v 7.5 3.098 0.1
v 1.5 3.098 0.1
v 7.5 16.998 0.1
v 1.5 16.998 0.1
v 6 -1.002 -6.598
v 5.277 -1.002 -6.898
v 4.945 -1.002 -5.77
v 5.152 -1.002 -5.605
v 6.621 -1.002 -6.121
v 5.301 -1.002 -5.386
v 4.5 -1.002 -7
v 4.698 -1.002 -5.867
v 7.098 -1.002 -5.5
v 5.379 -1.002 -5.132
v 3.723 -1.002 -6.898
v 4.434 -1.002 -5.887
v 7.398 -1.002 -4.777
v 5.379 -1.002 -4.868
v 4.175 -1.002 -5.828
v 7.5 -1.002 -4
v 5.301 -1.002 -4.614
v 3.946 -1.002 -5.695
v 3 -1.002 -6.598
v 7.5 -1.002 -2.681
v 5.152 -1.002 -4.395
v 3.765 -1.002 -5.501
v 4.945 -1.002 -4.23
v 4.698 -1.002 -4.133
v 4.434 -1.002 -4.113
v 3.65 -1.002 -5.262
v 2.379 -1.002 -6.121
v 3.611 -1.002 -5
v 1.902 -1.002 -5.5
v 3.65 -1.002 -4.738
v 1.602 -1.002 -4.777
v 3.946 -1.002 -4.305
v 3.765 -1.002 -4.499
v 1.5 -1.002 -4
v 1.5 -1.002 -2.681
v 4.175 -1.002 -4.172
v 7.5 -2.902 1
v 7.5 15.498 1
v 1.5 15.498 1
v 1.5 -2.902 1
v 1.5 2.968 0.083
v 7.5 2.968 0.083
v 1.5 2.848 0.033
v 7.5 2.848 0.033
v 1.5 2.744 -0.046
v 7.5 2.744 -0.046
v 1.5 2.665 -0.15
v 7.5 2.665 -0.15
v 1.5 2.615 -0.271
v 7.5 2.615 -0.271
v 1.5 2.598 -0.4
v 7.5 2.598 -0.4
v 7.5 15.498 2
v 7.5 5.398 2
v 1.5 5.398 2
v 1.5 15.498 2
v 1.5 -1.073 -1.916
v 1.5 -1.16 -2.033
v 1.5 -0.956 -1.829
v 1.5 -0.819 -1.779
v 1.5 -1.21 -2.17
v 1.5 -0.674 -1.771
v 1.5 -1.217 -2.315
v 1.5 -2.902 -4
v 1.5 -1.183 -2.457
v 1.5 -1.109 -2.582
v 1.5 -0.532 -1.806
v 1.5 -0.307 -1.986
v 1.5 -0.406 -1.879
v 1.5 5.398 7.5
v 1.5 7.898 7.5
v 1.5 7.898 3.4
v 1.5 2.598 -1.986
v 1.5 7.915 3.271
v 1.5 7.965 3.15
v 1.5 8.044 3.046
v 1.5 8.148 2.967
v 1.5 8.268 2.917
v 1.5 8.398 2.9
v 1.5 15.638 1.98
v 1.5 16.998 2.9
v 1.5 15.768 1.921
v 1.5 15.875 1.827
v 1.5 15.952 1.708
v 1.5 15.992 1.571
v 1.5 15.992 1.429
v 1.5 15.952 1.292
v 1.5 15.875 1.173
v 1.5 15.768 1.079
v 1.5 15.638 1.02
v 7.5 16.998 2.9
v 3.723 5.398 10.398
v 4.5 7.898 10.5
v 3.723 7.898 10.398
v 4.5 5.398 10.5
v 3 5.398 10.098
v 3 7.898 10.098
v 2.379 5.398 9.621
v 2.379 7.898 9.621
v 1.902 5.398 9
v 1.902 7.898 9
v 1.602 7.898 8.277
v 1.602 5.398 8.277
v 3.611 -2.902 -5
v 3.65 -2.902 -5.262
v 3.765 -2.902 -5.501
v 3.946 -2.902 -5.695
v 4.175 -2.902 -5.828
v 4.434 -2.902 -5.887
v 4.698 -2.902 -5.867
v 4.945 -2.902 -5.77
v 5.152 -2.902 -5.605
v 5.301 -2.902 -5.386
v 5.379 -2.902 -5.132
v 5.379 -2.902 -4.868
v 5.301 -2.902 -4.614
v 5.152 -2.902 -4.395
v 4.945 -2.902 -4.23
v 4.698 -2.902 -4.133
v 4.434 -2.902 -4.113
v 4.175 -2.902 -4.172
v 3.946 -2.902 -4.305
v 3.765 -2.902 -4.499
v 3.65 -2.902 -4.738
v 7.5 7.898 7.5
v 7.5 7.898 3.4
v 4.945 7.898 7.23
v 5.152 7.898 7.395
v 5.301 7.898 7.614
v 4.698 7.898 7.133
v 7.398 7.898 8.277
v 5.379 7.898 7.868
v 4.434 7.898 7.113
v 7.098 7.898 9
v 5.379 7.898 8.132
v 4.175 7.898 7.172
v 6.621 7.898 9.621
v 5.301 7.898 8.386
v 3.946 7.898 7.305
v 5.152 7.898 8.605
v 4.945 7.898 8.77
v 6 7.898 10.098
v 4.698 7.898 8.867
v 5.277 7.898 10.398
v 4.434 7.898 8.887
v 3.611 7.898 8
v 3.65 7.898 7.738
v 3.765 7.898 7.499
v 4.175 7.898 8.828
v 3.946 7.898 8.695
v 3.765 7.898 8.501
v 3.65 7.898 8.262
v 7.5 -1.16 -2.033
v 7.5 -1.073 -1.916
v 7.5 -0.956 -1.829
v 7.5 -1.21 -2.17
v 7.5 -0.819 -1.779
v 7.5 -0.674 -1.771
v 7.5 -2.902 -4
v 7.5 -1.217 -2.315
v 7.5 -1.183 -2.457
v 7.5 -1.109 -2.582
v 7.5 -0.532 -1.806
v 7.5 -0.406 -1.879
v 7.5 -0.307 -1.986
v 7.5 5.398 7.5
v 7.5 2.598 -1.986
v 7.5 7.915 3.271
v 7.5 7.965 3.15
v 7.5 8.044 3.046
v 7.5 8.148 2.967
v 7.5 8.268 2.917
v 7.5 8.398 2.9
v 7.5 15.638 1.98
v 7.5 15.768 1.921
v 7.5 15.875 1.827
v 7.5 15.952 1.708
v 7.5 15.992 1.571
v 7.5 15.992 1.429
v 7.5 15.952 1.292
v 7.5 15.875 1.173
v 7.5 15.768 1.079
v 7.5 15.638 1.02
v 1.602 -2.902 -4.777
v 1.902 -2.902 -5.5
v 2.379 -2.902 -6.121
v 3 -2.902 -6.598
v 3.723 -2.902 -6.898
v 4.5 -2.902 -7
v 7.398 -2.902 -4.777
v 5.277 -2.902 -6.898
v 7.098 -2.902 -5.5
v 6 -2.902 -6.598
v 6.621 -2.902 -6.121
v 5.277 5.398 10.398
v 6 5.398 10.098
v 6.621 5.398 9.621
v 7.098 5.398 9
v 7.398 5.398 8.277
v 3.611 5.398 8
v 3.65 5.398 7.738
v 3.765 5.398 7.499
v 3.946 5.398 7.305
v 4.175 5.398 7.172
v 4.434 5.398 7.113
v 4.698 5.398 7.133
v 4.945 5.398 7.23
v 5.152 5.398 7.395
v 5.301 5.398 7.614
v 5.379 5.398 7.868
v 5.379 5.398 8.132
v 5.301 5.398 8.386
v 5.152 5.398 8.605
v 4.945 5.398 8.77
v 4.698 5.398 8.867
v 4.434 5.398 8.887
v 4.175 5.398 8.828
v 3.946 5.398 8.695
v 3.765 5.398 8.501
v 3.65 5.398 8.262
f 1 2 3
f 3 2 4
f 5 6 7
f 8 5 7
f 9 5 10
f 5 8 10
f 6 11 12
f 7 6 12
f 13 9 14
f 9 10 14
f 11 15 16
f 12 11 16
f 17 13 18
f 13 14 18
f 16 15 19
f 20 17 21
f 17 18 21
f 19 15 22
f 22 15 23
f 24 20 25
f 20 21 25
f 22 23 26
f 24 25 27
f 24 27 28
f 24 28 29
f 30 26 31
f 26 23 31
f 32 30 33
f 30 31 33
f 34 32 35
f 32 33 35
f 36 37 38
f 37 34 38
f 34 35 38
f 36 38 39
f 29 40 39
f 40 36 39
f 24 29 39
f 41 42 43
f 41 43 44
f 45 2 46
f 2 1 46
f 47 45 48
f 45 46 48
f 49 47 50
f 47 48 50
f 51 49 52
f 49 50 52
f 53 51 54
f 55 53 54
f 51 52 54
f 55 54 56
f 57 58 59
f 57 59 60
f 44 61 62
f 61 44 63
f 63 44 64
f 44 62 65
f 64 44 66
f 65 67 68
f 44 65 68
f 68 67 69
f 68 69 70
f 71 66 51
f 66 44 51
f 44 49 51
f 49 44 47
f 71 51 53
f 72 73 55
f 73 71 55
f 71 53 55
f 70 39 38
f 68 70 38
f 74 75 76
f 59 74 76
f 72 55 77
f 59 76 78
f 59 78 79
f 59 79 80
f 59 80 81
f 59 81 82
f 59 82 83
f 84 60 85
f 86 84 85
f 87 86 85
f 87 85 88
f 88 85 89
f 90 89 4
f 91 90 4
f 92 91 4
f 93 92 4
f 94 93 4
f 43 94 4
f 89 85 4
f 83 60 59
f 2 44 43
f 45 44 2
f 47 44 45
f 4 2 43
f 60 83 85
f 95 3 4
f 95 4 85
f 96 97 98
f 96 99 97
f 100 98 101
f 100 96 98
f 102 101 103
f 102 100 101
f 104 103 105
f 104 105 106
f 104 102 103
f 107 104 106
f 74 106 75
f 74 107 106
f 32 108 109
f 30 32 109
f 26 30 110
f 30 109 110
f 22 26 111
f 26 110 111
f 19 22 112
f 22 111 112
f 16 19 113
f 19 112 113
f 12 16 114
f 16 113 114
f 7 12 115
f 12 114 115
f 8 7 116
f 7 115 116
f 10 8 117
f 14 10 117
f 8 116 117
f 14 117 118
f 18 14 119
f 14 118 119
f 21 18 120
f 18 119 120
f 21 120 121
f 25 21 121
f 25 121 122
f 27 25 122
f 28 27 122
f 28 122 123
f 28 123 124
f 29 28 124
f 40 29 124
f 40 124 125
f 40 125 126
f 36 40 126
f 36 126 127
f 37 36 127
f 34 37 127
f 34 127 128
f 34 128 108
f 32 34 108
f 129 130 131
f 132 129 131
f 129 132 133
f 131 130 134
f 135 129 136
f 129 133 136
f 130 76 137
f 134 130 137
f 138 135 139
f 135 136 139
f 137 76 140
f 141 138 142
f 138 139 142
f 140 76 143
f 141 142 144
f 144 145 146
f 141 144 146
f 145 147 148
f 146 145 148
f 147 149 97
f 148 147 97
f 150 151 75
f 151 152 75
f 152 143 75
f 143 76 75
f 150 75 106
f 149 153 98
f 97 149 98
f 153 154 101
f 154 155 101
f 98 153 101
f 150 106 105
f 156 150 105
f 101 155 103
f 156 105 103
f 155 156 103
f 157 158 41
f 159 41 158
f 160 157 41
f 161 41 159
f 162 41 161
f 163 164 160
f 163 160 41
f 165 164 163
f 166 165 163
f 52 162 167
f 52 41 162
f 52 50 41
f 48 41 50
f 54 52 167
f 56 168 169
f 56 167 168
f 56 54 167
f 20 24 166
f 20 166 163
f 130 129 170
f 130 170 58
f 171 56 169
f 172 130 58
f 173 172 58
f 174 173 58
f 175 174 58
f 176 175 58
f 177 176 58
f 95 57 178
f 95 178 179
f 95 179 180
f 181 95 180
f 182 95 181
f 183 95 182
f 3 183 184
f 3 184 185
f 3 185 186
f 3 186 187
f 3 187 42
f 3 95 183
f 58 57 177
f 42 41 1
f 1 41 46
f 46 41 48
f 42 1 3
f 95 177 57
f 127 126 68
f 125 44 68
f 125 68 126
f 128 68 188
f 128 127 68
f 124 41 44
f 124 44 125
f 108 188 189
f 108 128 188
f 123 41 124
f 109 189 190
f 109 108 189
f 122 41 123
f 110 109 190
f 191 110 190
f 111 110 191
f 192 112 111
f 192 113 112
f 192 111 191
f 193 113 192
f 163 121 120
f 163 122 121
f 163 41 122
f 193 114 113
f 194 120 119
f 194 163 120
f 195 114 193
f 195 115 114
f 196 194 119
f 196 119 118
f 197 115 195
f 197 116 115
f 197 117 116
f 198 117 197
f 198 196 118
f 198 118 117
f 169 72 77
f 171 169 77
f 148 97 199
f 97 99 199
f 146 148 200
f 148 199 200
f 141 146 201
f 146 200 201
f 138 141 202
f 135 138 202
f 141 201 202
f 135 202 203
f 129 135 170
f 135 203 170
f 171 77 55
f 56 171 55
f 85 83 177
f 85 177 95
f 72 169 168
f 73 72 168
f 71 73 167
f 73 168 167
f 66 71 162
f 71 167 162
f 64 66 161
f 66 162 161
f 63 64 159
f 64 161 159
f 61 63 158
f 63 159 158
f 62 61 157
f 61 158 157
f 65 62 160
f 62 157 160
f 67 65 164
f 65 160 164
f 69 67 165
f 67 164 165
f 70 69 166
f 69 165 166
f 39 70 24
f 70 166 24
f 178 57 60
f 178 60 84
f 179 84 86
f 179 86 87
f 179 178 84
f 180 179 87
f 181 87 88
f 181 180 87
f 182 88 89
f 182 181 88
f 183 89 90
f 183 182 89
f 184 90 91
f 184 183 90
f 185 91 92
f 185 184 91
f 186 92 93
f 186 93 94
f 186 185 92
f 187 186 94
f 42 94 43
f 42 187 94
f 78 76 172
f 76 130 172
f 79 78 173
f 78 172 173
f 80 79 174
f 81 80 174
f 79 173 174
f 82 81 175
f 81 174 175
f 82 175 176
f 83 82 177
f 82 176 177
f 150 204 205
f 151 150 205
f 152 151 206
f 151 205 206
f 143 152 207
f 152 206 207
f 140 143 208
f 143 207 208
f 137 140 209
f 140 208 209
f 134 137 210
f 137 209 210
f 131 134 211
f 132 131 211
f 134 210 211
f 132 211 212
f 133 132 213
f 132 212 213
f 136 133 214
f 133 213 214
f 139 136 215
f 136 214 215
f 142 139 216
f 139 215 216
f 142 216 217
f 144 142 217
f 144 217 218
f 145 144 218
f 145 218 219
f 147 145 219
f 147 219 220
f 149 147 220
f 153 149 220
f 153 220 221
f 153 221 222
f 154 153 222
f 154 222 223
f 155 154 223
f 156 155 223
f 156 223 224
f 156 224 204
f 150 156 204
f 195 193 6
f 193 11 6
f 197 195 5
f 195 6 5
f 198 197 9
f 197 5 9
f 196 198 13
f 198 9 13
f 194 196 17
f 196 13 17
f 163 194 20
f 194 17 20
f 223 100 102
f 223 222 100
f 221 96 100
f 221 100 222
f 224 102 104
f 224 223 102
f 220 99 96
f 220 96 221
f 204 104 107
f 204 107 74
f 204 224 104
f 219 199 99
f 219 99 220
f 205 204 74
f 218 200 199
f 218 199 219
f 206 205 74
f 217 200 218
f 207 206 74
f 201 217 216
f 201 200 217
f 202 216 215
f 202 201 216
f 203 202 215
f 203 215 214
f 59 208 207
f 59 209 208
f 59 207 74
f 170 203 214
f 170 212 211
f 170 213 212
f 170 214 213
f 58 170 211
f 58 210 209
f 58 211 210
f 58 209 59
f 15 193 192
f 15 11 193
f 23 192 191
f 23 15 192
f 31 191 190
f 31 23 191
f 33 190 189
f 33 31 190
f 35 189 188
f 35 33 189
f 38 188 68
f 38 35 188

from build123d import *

# Parameters (mm, degrees)
BOSS_EXTRUDE1_DEPTH   = 6
SKETCH3_W             = 7.6
SKETCH3_H             = 7.1
SKETCH3_H_2           = 14.9
CUT_EXTRUDE2_DEPTH    = 21.860671783
SKETCH4_W             = 7.6
SKETCH4_H             = 2.5
SKETCH4_W_2           = 5.5
SKETCH4_H_2           = 3.6
CUT_EXTRUDE3_DEPTH    = 21.860671783
FILLET2_R             = 3
F_2_56_TAPPED_HOLE1_D = 1.778
FILLET3_R             = 0.5
F_2_56_TAPPED_HOLE2_D = 1.778
SKETCH19_R            = 0.5
CUT_EXTRUDE6_DEPTH    = 21.860671783


with BuildPart() as part:
    # Sketch1 → Boss-Extrude1 (new body)
    with BuildSketch(Plane(origin=(7.5, 0, 0), x_dir=(0, 0, -1), z_dir=(1, 0, 0))):
        with BuildLine():
            Line((-10.5, 16.997577099), (-10.5, 5.397577099))
            Line((-10.5, 5.397577099), (-2, 5.397577099))
            Line((-2, 5.397577099), (-2, 15.497577099))
            ThreePointArc((-2, 15.497577099), (-1.5, 15.997577099), (-1, 15.497577099))
            Line((-1, 15.497577099), (-1, -2.902422901))
            Line((-1, -2.902422901), (7, -2.902422901))
            Line((7, -2.902422901), (7, 16.997577099))
            Line((7, 16.997577099), (-10.5, 16.997577099))
        make_face()
    extrude(amount=-BOSS_EXTRUDE1_DEPTH)

    # Sketch3 → Cut-Extrude2 (cut, through all)
    with BuildSketch(Plane.ZY.offset(-1.5)):
        with Locations((6.7, 13.947577099)):
            Rectangle(SKETCH3_W, SKETCH3_H)
        with Locations((-3.7, 10.047577099)):
            Rectangle(SKETCH3_W, SKETCH3_H_2)
    extrude(amount=-CUT_EXTRUDE2_DEPTH, mode=Mode.SUBTRACT)

    # Sketch4 → Cut-Extrude3 (cut, through all)
    with BuildSketch(Plane.ZY.offset(-1.5)):
        with Locations((6.7, 9.147577099)):
            Rectangle(SKETCH4_W, SKETCH4_H)
        with Locations((-4.736302331, 0.797577099)):
            Rectangle(SKETCH4_W_2, SKETCH4_H_2)
    extrude(amount=-CUT_EXTRUDE3_DEPTH, mode=Mode.SUBTRACT)

    # Fillet2
    fillet2_edges = [part.edges().sort_by_distance(p)[0] for p in [
        (1.5, 6.647577099, 10.5),
        (7.5, 6.647577099, 10.5),
        (7.5, -1.952422901, -7),
        (1.5, -1.952422901, -7),
    ]]
    fillet(fillet2_edges, radius=FILLET2_R - 0.0001)  # a hair under: the kernel refuses the full size

    # #2-56 Tapped Hole1 (through all)
    with Locations(Plane(origin=(0, 7.897577099, 0), x_dir=(1, 0, 0), z_dir=(0, 1, 0))):
        with Locations((4.5, -8)):
            Hole(F_2_56_TAPPED_HOLE1_D / 2)

    # Fillet3
    fillet3_edges = [part.edges().sort_by_distance(p)[0] for p in [
        (4.5, 2.597577099, 0.1),
        (4.5, 7.897577099, 2.9),
    ]]
    fillet(fillet3_edges, radius=FILLET3_R)

    # #2-56 Tapped Hole2 (through all)
    with Locations(Plane(origin=(0, -1.002422901, 0), x_dir=(1, 0, 0), z_dir=(0, 1, 0))):
        with Locations((4.5, 5)):
            Hole(F_2_56_TAPPED_HOLE2_D / 2)

    # Sketch19 → Cut-Extrude6 (cut, through all)
    with BuildSketch(Plane(origin=(7.5, 0, 0), x_dir=(0, 0, -1), z_dir=(1, 0, 0))):
        with Locations((2.269145043, -0.719580189)):
            Circle(SKETCH19_R)
    extrude(amount=-CUT_EXTRUDE6_DEPTH, mode=Mode.SUBTRACT)


solid = part.part
